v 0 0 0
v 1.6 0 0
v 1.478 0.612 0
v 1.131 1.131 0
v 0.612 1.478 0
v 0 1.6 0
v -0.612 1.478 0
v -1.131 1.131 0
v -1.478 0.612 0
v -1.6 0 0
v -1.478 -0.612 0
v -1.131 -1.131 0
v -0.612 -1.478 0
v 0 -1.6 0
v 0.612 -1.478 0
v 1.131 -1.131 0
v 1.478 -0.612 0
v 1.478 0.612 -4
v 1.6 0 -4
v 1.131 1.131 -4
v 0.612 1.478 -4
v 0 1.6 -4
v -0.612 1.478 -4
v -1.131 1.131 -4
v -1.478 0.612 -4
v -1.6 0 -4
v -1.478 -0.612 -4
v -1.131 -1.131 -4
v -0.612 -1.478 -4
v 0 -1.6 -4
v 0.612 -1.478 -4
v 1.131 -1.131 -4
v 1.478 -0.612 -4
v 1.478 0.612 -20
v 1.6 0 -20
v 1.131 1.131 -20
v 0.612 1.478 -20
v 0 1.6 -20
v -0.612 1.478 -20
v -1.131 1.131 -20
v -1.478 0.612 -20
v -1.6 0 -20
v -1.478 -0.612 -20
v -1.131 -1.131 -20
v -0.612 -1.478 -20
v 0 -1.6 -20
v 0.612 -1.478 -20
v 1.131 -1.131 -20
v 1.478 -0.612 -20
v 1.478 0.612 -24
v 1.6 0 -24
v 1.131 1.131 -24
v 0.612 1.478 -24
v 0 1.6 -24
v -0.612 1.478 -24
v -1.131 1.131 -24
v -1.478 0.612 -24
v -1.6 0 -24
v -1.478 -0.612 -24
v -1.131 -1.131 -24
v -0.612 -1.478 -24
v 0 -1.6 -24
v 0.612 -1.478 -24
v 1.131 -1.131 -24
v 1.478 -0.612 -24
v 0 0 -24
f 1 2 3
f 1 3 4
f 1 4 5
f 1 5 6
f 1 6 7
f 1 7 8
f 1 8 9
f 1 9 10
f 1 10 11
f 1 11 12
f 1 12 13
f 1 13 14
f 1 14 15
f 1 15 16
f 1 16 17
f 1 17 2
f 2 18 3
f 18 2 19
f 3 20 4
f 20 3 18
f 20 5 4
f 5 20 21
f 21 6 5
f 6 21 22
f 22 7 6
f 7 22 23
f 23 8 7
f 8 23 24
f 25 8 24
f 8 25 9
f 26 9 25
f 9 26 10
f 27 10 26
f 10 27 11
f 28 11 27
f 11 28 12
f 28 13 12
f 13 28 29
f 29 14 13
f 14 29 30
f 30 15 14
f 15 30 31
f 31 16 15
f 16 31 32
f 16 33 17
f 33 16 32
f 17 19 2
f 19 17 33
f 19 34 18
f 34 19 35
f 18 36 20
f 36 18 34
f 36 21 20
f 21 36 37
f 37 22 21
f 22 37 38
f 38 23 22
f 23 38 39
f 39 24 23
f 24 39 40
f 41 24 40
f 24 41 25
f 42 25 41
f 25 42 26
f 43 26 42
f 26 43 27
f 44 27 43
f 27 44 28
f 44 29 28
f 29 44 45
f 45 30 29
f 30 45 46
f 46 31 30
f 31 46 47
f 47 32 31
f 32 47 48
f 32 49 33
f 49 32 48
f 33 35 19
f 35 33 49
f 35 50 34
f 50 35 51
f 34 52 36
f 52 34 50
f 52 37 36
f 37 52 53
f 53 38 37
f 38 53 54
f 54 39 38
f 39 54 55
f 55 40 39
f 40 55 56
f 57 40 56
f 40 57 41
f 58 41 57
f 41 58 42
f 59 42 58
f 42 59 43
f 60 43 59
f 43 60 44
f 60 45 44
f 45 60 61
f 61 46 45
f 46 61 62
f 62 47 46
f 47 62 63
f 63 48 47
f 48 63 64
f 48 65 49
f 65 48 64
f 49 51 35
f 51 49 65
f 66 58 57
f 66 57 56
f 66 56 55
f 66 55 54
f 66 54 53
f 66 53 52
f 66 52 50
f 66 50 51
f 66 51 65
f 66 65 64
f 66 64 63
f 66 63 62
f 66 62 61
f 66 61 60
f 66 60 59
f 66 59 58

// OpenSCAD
// file: ../p/4-4edge.scad
use <../lib.scad>
function ldraw_lib__4_4edge() = [
// 0 Circle 1.0
// 0 Name: 4-4edge.dat
// 0 Author: James Jessiman
// 0 !LDRAW_ORG Primitive UPDATE 2017-01
// 0 !LICENSE Licensed under CC BY 4.0 : see CAreadme.txt
// 
// 0 BFC CERTIFY CCW
  [0,"BFC","CERTIFY"],
  [0,"BFC","CCW"],
// 
// 0 !HISTORY 1998-12-15 [PTadmin] Official Update 1998-10
// 0 !HISTORY 2005-12-28 [PTadmin] Official Update 2005-01
// 0 !HISTORY 2007-06-24 [PTadmin] Header formatted for Contributor Agreement
// 0 !HISTORY 2008-07-01 [PTadmin] Official Update 2008-01
// 0 !HISTORY 2017-01-15 [Steffen] BFCed
// 0 !HISTORY 2017-12-30 [PTadmin] Official Update 2017-01
// 
// 
// 2 24 1 0 0 0.9239 0 0.3827
  [2,24,1,0,0,0.9239,0,0.3827],
// 2 24 0.9239 0 0.3827 0.7071 0 0.7071
  [2,24,0.9239,0,0.3827,0.7071,0,0.7071],
// 2 24 0.7071 0 0.7071 0.3827 0 0.9239
  [2,24,0.7071,0,0.7071,0.3827,0,0.9239],
// 2 24 0.3827 0 0.9239 0 0 1
  [2,24,0.3827,0,0.9239,0,0,1],
// 2 24 0 0 1 -0.3827 0 0.9239
  [2,24,0,0,1,-0.3827,0,0.9239],
// 2 24 -0.3827 0 0.9239 -0.7071 0 0.7071
  [2,24,-0.3827,0,0.9239,-0.7071,0,0.7071],
// 2 24 -0.7071 0 0.7071 -0.9239 0 0.3827
  [2,24,-0.7071,0,0.7071,-0.9239,0,0.3827],
// 2 24 -0.9239 0 0.3827 -1 0 -0
  [2,24,-0.9239,0,0.3827,-1,0,-0],
// 2 24 -1 0 -0 -0.9239 0 -0.3827
  [2,24,-1,0,-0,-0.9239,0,-0.3827],
// 2 24 -0.9239 0 -0.3827 -0.7071 0 -0.7071
  [2,24,-0.9239,0,-0.3827,-0.7071,0,-0.7071],
// 2 24 -0.7071 0 -0.7071 -0.3827 0 -0.9239
  [2,24,-0.7071,0,-0.7071,-0.3827,0,-0.9239],
// 2 24 -0.3827 0 -0.9239 0 0 -1
  [2,24,-0.3827,0,-0.9239,0,0,-1],
// 2 24 0 0 -1 0.3827 0 -0.9239
  [2,24,0,0,-1,0.3827,0,-0.9239],
// 2 24 0.3827 0 -0.9239 0.7071 0 -0.7071
  [2,24,0.3827,0,-0.9239,0.7071,0,-0.7071],
// 2 24 0.7071 0 -0.7071 0.9239 0 -0.3827
  [2,24,0.7071,0,-0.7071,0.9239,0,-0.3827],
// 2 24 0.9239 0 -0.3827 1 0 0
  [2,24,0.9239,0,-0.3827,1,0,0],
];
module ldraw_lib__4_4edge(step=0, col=false, unit=2/5, alt=false, line=0.2, solid=!$preview)
    makepoly(ldraw_lib__4_4edge(), step=step, col=col, unit=unit, alt=alt, line=line, solid=solid);
ldraw_lib__4_4edge(line=0.2);
// file: ../p/4-4disc.scad
use <../lib.scad>
function ldraw_lib__4_4disc() = [
// 0 Disc 1.0
// 0 Name: 4-4disc.dat
// 0 Author: James Jessiman
// 0 !LDRAW_ORG Primitive UPDATE 2002-02
// 0 !LICENSE Licensed under CC BY 4.0 : see CAreadme.txt
// 
// 0 BFC CERTIFY CCW
  [0,"BFC","CERTIFY"],
  [0,"BFC","CCW"],
// 
// 0 !HISTORY 1998-12-15 [PTadmin] Official Update 1998-10
// 0 !HISTORY 2002-03-23 [sbliss] Added BFC statement
// 0 !HISTORY 2002-04-25 [PTadmin] Official Update 2002-02
// 0 !HISTORY 2007-06-24 [PTadmin] Header formatted for Contributor Agreement
// 0 !HISTORY 2008-07-01 [PTadmin] Official Update 2008-01
// 
// 
// 3 16 0 0 0 1 0 0 0.9239 0 0.3827
  [3,16,0,0,0,1,0,0,0.9239,0,0.3827],
// 3 16 0 0 0 0.9239 0 0.3827 0.7071 0 0.7071
  [3,16,0,0,0,0.9239,0,0.3827,0.7071,0,0.7071],
// 3 16 0 0 0 0.7071 0 0.7071 0.3827 0 0.9239
  [3,16,0,0,0,0.7071,0,0.7071,0.3827,0,0.9239],
// 3 16 0 0 0 0.3827 0 0.9239 0 0 1
  [3,16,0,0,0,0.3827,0,0.9239,0,0,1],
// 3 16 0 0 0 0 0 1 -0.3827 0 0.9239
  [3,16,0,0,0,0,0,1,-0.3827,0,0.9239],
// 3 16 0 0 0 -0.3827 0 0.9239 -0.7071 0 0.7071
  [3,16,0,0,0,-0.3827,0,0.9239,-0.7071,0,0.7071],
// 3 16 0 0 0 -0.7071 0 0.7071 -0.9239 0 0.3827
  [3,16,0,0,0,-0.7071,0,0.7071,-0.9239,0,0.3827],
// 3 16 0 0 0 -0.9239 0 0.3827 -1 0 -0
  [3,16,0,0,0,-0.9239,0,0.3827,-1,0,-0],
// 3 16 0 0 0 -1 0 -0 -0.9239 0 -0.3827
  [3,16,0,0,0,-1,0,-0,-0.9239,0,-0.3827],
// 3 16 0 0 0 -0.9239 0 -0.3827 -0.7071 0 -0.7071
  [3,16,0,0,0,-0.9239,0,-0.3827,-0.7071,0,-0.7071],
// 3 16 0 0 0 -0.7071 0 -0.7071 -0.3827 0 -0.9239
  [3,16,0,0,0,-0.7071,0,-0.7071,-0.3827,0,-0.9239],
// 3 16 0 0 0 -0.3827 0 -0.9239 0 0 -1
  [3,16,0,0,0,-0.3827,0,-0.9239,0,0,-1],
// 3 16 0 0 0 0 0 -1 0.3827 0 -0.9239
  [3,16,0,0,0,0,0,-1,0.3827,0,-0.9239],
// 3 16 0 0 0 0.3827 0 -0.9239 0.7071 0 -0.7071
  [3,16,0,0,0,0.3827,0,-0.9239,0.7071,0,-0.7071],
// 3 16 0 0 0 0.7071 0 -0.7071 0.9239 0 -0.3827
  [3,16,0,0,0,0.7071,0,-0.7071,0.9239,0,-0.3827],
// 3 16 0 0 0 0.9239 0 -0.3827 1 0 0
  [3,16,0,0,0,0.9239,0,-0.3827,1,0,0],
// 0
];
module ldraw_lib__4_4disc(step=0, col=false, unit=2/5, alt=false, line=0.2, solid=!$preview)
    makepoly(ldraw_lib__4_4disc(), step=step, col=col, unit=unit, alt=alt, line=line, solid=solid);
ldraw_lib__4_4disc(line=0.2);
// file: ../p/4-4cyli.scad
use <../lib.scad>
function ldraw_lib__4_4cyli() = [
// 0 Cylinder 1.0
// 0 Name: 4-4cyli.dat
// 0 Author: James Jessiman
// 0 !LDRAW_ORG Primitive UPDATE 2005-01
// 0 !LICENSE Licensed under CC BY 2.0 and CC BY 4.0 : see CAreadme.txt
// 
// 0 BFC CERTIFY CCW
  [0,"BFC","CERTIFY"],
  [0,"BFC","CCW"],
// 
// 0 !HISTORY 1998-12-15 [PTadmin] Official Update 1998-10
// 0 !HISTORY 2002-03-23 [sbliss] Added BFC statement; merged headers from files in distributions LDraw 0.27 and Complete.
// 0 !HISTORY 2002-04-25 [PTadmin] Official Update 2002-02
// 0 !HISTORY 2004-12-14 [guyvivan] BFC CCW
// 0 !HISTORY 2005-12-28 [PTadmin] Official Update 2005-01
// 0 !HISTORY 2007-06-24 [PTadmin] Header formatted for Contributor Agreement
// 0 !HISTORY 2008-07-01 [PTadmin] Official Update 2008-01
// 
// 
// 4 16 1 1 0 0.9239 1 0.3827 0.9239 0 0.3827 1 0 0
  [4,16,1,1,0,0.9239,1,0.3827,0.9239,0,0.3827,1,0,0],
// 5 24 1 0 0 1 1 0 0.9239 0 0.3827 0.9239 0 -0.3827
  [5,24,1,0,0,1,1,0,0.9239,0,0.3827,0.9239,0,-0.3827],
// 4 16 0.9239 1 0.3827 0.7071 1 0.7071 0.7071 0 0.7071 0.9239 0 0.3827
  [4,16,0.9239,1,0.3827,0.7071,1,0.7071,0.7071,0,0.7071,0.9239,0,0.3827],
// 5 24 0.9239 0 0.3827 0.9239 1 0.3827 0.7071 0 0.7071 1 0 0
  [5,24,0.9239,0,0.3827,0.9239,1,0.3827,0.7071,0,0.7071,1,0,0],
// 4 16 0.7071 1 0.7071 0.3827 1 0.9239 0.3827 0 0.9239 0.7071 0 0.7071
  [4,16,0.7071,1,0.7071,0.3827,1,0.9239,0.3827,0,0.9239,0.7071,0,0.7071],
// 5 24 0.7071 0 0.7071 0.7071 1 0.7071 0.3827 0 0.9239 0.9239 0 0.3827
  [5,24,0.7071,0,0.7071,0.7071,1,0.7071,0.3827,0,0.9239,0.9239,0,0.3827],
// 4 16 0.3827 1 0.9239 0 1 1 0 0 1 0.3827 0 0.9239
  [4,16,0.3827,1,0.9239,0,1,1,0,0,1,0.3827,0,0.9239],
// 5 24 0.3827 0 0.9239 0.3827 1 0.9239 0 0 1 0.7071 0 0.7071
  [5,24,0.3827,0,0.9239,0.3827,1,0.9239,0,0,1,0.7071,0,0.7071],
// 4 16 0 1 1 -0.3827 1 0.9239 -0.3827 0 0.9239 0 0 1
  [4,16,0,1,1,-0.3827,1,0.9239,-0.3827,0,0.9239,0,0,1],
// 5 24 0 0 1 0 1 1 -0.3827 0 0.9239 0.3827 0 0.9239
  [5,24,0,0,1,0,1,1,-0.3827,0,0.9239,0.3827,0,0.9239],
// 4 16 -0.3827 1 0.9239 -0.7071 1 0.7071 -0.7071 0 0.7071 -0.3827 0 0.9239
  [4,16,-0.3827,1,0.9239,-0.7071,1,0.7071,-0.7071,0,0.7071,-0.3827,0,0.9239],
// 5 24 -0.3827 0 0.9239 -0.3827 1 0.9239 -0.7071 0 0.7071 0 0 1
  [5,24,-0.3827,0,0.9239,-0.3827,1,0.9239,-0.7071,0,0.7071,0,0,1],
// 4 16 -0.7071 1 0.7071 -0.9239 1 0.3827 -0.9239 0 0.3827 -0.7071 0 0.7071
  [4,16,-0.7071,1,0.7071,-0.9239,1,0.3827,-0.9239,0,0.3827,-0.7071,0,0.7071],
// 5 24 -0.7071 0 0.7071 -0.7071 1 0.7071 -0.9239 0 0.3827 -0.3827 0 0.9239
  [5,24,-0.7071,0,0.7071,-0.7071,1,0.7071,-0.9239,0,0.3827,-0.3827,0,0.9239],
// 4 16 -0.9239 1 0.3827 -1 1 0 -1 0 0 -0.9239 0 0.3827
  [4,16,-0.9239,1,0.3827,-1,1,0,-1,0,0,-0.9239,0,0.3827],
// 5 24 -0.9239 0 0.3827 -0.9239 1 0.3827 -1 0 0 -0.7071 0 0.7071
  [5,24,-0.9239,0,0.3827,-0.9239,1,0.3827,-1,0,0,-0.7071,0,0.7071],
// 4 16 -1 1 0 -0.9239 1 -0.3827 -0.9239 0 -0.3827 -1 0 0
  [4,16,-1,1,0,-0.9239,1,-0.3827,-0.9239,0,-0.3827,-1,0,0],
// 5 24 -1 0 0 -1 1 0 -0.9239 0 -0.3827 -0.9239 0 0.3827
  [5,24,-1,0,0,-1,1,0,-0.9239,0,-0.3827,-0.9239,0,0.3827],
// 4 16 -0.9239 1 -0.3827 -0.7071 1 -0.7071 -0.7071 0 -0.7071 -0.9239 0 -0.3827
  [4,16,-0.9239,1,-0.3827,-0.7071,1,-0.7071,-0.7071,0,-0.7071,-0.9239,0,-0.3827],
// 5 24 -0.9239 0 -0.3827 -0.9239 1 -0.3827 -0.7071 0 -0.7071 -1 0 0
  [5,24,-0.9239,0,-0.3827,-0.9239,1,-0.3827,-0.7071,0,-0.7071,-1,0,0],
// 4 16 -0.7071 1 -0.7071 -0.3827 1 -0.9239 -0.3827 0 -0.9239 -0.7071 0 -0.7071
  [4,16,-0.7071,1,-0.7071,-0.3827,1,-0.9239,-0.3827,0,-0.9239,-0.7071,0,-0.7071],
// 5 24 -0.7071 0 -0.7071 -0.7071 1 -0.7071 -0.3827 0 -0.9239 -0.9239 0 -0.3827
  [5,24,-0.7071,0,-0.7071,-0.7071,1,-0.7071,-0.3827,0,-0.9239,-0.9239,0,-0.3827],
// 4 16 -0.3827 1 -0.9239 0 1 -1 0 0 -1 -0.3827 0 -0.9239
  [4,16,-0.3827,1,-0.9239,0,1,-1,0,0,-1,-0.3827,0,-0.9239],
// 5 24 -0.3827 0 -0.9239 -0.3827 1 -0.9239 0 0 -1 -0.7071 0 -0.7071
  [5,24,-0.3827,0,-0.9239,-0.3827,1,-0.9239,0,0,-1,-0.7071,0,-0.7071],
// 4 16 0 1 -1 0.3827 1 -0.9239 0.3827 0 -0.9239 0 0 -1
  [4,16,0,1,-1,0.3827,1,-0.9239,0.3827,0,-0.9239,0,0,-1],
// 5 24 0 0 -1 0 1 -1 0.3827 0 -0.9239 -0.3827 0 -0.9239
  [5,24,0,0,-1,0,1,-1,0.3827,0,-0.9239,-0.3827,0,-0.9239],
// 4 16 0.3827 1 -0.9239 0.7071 1 -0.7071 0.7071 0 -0.7071 0.3827 0 -0.9239
  [4,16,0.3827,1,-0.9239,0.7071,1,-0.7071,0.7071,0,-0.7071,0.3827,0,-0.9239],
// 5 24 0.3827 0 -0.9239 0.3827 1 -0.9239 0.7071 0 -0.7071 0 0 -1
  [5,24,0.3827,0,-0.9239,0.3827,1,-0.9239,0.7071,0,-0.7071,0,0,-1],
// 4 16 0.7071 1 -0.7071 0.9239 1 -0.3827 0.9239 0 -0.3827 0.7071 0 -0.7071
  [4,16,0.7071,1,-0.7071,0.9239,1,-0.3827,0.9239,0,-0.3827,0.7071,0,-0.7071],
// 5 24 0.7071 0 -0.7071 0.7071 1 -0.7071 0.9239 0 -0.3827 0.3827 0 -0.9239
  [5,24,0.7071,0,-0.7071,0.7071,1,-0.7071,0.9239,0,-0.3827,0.3827,0,-0.9239],
// 4 16 0.9239 1 -0.3827 1 1 0 1 0 0 0.9239 0 -0.3827
  [4,16,0.9239,1,-0.3827,1,1,0,1,0,0,0.9239,0,-0.3827],
// 5 24 0.9239 0 -0.3827 0.9239 1 -0.3827 1 0 0 0.7071 0 -0.7071
  [5,24,0.9239,0,-0.3827,0.9239,1,-0.3827,1,0,0,0.7071,0,-0.7071],
// 0
];
module ldraw_lib__4_4cyli(step=0, col=false, unit=2/5, alt=false, line=0.2, solid=!$preview)
    makepoly(ldraw_lib__4_4cyli(), step=step, col=col, unit=unit, alt=alt, line=line, solid=solid);
ldraw_lib__4_4cyli(line=0.2);
// main file
use <../lib.scad>
use <../p/4-4cyli.scad>
use <../p/4-4disc.scad>
use <../p/4-4edge.scad>
function ldraw_lib__87994p01() = [
// 0 Bar  3L with White Ends Pattern
// 0 Name: 87994p01.dat
// 0 Author: Chris Dee [cwdee]
// 0 !LDRAW_ORG Part UPDATE 2015-01
// 0 !LICENSE Licensed under CC BY 4.0 : see CAreadme.txt
// 
// 0 BFC CERTIFY CW
  [0,"BFC","CERTIFY"],
  [0,"BFC","CW"],
// 
// 0 !KEYWORDS magic man, magic wand, magician
// 
// 0 !HISTORY 2010-12-31 [PTadmin] Official Update 2010-03
// 0 !HISTORY 2015-07-09 [cwdee] Adjusted description
// 0 !HISTORY 2015-10-11 [PTadmin] Official Update 2015-01
// 
// 
// 1 16 0 0 0 4 0 0 0 1 0 0 0 4 4-4edge.dat
  [1,16,0,0,0,4,0,0,0,1,0,0,0,4, ldraw_lib__4_4edge()],
// 1 15 0 0 0 4 0 0 0 1 0 0 0 4 4-4disc.dat
  [1,15,0,0,0,4,0,0,0,1,0,0,0,4, ldraw_lib__4_4disc()],
// 1 15 0 0 0 4 0 0 0 10 0 0 0 4 4-4cyli.dat
  [1,15,0,0,0,4,0,0,0,10,0,0,0,4, ldraw_lib__4_4cyli()],
// 1 16 0 10 0 4 0 0 0 40 0 0 0 4 4-4cyli.dat
  [1,16,0,10,0,4,0,0,0,40,0,0,0,4, ldraw_lib__4_4cyli()],
// 1 15 0 50 0 4 0 0 0 10 0 0 0 4 4-4cyli.dat
  [1,15,0,50,0,4,0,0,0,10,0,0,0,4, ldraw_lib__4_4cyli()],
// 1 16 0 60 0 4 0 0 0 1 0 0 0 4 4-4edge.dat
  [1,16,0,60,0,4,0,0,0,1,0,0,0,4, ldraw_lib__4_4edge()],
// 1 15 0 60 0 -4 0 0 0 -1 0 0 0 4 4-4disc.dat
  [1,15,0,60,0,-4,0,0,0,-1,0,0,0,4, ldraw_lib__4_4disc()],
// 0
];
module ldraw_lib__87994p01(step=0, col=false, unit=2/5, alt=false, line=0.2, solid=!$preview)
    makepoly(ldraw_lib__87994p01(), step=step, col=col, unit=unit, alt=alt, line=line, solid=solid);
ldraw_lib__87994p01(line=0.2);
